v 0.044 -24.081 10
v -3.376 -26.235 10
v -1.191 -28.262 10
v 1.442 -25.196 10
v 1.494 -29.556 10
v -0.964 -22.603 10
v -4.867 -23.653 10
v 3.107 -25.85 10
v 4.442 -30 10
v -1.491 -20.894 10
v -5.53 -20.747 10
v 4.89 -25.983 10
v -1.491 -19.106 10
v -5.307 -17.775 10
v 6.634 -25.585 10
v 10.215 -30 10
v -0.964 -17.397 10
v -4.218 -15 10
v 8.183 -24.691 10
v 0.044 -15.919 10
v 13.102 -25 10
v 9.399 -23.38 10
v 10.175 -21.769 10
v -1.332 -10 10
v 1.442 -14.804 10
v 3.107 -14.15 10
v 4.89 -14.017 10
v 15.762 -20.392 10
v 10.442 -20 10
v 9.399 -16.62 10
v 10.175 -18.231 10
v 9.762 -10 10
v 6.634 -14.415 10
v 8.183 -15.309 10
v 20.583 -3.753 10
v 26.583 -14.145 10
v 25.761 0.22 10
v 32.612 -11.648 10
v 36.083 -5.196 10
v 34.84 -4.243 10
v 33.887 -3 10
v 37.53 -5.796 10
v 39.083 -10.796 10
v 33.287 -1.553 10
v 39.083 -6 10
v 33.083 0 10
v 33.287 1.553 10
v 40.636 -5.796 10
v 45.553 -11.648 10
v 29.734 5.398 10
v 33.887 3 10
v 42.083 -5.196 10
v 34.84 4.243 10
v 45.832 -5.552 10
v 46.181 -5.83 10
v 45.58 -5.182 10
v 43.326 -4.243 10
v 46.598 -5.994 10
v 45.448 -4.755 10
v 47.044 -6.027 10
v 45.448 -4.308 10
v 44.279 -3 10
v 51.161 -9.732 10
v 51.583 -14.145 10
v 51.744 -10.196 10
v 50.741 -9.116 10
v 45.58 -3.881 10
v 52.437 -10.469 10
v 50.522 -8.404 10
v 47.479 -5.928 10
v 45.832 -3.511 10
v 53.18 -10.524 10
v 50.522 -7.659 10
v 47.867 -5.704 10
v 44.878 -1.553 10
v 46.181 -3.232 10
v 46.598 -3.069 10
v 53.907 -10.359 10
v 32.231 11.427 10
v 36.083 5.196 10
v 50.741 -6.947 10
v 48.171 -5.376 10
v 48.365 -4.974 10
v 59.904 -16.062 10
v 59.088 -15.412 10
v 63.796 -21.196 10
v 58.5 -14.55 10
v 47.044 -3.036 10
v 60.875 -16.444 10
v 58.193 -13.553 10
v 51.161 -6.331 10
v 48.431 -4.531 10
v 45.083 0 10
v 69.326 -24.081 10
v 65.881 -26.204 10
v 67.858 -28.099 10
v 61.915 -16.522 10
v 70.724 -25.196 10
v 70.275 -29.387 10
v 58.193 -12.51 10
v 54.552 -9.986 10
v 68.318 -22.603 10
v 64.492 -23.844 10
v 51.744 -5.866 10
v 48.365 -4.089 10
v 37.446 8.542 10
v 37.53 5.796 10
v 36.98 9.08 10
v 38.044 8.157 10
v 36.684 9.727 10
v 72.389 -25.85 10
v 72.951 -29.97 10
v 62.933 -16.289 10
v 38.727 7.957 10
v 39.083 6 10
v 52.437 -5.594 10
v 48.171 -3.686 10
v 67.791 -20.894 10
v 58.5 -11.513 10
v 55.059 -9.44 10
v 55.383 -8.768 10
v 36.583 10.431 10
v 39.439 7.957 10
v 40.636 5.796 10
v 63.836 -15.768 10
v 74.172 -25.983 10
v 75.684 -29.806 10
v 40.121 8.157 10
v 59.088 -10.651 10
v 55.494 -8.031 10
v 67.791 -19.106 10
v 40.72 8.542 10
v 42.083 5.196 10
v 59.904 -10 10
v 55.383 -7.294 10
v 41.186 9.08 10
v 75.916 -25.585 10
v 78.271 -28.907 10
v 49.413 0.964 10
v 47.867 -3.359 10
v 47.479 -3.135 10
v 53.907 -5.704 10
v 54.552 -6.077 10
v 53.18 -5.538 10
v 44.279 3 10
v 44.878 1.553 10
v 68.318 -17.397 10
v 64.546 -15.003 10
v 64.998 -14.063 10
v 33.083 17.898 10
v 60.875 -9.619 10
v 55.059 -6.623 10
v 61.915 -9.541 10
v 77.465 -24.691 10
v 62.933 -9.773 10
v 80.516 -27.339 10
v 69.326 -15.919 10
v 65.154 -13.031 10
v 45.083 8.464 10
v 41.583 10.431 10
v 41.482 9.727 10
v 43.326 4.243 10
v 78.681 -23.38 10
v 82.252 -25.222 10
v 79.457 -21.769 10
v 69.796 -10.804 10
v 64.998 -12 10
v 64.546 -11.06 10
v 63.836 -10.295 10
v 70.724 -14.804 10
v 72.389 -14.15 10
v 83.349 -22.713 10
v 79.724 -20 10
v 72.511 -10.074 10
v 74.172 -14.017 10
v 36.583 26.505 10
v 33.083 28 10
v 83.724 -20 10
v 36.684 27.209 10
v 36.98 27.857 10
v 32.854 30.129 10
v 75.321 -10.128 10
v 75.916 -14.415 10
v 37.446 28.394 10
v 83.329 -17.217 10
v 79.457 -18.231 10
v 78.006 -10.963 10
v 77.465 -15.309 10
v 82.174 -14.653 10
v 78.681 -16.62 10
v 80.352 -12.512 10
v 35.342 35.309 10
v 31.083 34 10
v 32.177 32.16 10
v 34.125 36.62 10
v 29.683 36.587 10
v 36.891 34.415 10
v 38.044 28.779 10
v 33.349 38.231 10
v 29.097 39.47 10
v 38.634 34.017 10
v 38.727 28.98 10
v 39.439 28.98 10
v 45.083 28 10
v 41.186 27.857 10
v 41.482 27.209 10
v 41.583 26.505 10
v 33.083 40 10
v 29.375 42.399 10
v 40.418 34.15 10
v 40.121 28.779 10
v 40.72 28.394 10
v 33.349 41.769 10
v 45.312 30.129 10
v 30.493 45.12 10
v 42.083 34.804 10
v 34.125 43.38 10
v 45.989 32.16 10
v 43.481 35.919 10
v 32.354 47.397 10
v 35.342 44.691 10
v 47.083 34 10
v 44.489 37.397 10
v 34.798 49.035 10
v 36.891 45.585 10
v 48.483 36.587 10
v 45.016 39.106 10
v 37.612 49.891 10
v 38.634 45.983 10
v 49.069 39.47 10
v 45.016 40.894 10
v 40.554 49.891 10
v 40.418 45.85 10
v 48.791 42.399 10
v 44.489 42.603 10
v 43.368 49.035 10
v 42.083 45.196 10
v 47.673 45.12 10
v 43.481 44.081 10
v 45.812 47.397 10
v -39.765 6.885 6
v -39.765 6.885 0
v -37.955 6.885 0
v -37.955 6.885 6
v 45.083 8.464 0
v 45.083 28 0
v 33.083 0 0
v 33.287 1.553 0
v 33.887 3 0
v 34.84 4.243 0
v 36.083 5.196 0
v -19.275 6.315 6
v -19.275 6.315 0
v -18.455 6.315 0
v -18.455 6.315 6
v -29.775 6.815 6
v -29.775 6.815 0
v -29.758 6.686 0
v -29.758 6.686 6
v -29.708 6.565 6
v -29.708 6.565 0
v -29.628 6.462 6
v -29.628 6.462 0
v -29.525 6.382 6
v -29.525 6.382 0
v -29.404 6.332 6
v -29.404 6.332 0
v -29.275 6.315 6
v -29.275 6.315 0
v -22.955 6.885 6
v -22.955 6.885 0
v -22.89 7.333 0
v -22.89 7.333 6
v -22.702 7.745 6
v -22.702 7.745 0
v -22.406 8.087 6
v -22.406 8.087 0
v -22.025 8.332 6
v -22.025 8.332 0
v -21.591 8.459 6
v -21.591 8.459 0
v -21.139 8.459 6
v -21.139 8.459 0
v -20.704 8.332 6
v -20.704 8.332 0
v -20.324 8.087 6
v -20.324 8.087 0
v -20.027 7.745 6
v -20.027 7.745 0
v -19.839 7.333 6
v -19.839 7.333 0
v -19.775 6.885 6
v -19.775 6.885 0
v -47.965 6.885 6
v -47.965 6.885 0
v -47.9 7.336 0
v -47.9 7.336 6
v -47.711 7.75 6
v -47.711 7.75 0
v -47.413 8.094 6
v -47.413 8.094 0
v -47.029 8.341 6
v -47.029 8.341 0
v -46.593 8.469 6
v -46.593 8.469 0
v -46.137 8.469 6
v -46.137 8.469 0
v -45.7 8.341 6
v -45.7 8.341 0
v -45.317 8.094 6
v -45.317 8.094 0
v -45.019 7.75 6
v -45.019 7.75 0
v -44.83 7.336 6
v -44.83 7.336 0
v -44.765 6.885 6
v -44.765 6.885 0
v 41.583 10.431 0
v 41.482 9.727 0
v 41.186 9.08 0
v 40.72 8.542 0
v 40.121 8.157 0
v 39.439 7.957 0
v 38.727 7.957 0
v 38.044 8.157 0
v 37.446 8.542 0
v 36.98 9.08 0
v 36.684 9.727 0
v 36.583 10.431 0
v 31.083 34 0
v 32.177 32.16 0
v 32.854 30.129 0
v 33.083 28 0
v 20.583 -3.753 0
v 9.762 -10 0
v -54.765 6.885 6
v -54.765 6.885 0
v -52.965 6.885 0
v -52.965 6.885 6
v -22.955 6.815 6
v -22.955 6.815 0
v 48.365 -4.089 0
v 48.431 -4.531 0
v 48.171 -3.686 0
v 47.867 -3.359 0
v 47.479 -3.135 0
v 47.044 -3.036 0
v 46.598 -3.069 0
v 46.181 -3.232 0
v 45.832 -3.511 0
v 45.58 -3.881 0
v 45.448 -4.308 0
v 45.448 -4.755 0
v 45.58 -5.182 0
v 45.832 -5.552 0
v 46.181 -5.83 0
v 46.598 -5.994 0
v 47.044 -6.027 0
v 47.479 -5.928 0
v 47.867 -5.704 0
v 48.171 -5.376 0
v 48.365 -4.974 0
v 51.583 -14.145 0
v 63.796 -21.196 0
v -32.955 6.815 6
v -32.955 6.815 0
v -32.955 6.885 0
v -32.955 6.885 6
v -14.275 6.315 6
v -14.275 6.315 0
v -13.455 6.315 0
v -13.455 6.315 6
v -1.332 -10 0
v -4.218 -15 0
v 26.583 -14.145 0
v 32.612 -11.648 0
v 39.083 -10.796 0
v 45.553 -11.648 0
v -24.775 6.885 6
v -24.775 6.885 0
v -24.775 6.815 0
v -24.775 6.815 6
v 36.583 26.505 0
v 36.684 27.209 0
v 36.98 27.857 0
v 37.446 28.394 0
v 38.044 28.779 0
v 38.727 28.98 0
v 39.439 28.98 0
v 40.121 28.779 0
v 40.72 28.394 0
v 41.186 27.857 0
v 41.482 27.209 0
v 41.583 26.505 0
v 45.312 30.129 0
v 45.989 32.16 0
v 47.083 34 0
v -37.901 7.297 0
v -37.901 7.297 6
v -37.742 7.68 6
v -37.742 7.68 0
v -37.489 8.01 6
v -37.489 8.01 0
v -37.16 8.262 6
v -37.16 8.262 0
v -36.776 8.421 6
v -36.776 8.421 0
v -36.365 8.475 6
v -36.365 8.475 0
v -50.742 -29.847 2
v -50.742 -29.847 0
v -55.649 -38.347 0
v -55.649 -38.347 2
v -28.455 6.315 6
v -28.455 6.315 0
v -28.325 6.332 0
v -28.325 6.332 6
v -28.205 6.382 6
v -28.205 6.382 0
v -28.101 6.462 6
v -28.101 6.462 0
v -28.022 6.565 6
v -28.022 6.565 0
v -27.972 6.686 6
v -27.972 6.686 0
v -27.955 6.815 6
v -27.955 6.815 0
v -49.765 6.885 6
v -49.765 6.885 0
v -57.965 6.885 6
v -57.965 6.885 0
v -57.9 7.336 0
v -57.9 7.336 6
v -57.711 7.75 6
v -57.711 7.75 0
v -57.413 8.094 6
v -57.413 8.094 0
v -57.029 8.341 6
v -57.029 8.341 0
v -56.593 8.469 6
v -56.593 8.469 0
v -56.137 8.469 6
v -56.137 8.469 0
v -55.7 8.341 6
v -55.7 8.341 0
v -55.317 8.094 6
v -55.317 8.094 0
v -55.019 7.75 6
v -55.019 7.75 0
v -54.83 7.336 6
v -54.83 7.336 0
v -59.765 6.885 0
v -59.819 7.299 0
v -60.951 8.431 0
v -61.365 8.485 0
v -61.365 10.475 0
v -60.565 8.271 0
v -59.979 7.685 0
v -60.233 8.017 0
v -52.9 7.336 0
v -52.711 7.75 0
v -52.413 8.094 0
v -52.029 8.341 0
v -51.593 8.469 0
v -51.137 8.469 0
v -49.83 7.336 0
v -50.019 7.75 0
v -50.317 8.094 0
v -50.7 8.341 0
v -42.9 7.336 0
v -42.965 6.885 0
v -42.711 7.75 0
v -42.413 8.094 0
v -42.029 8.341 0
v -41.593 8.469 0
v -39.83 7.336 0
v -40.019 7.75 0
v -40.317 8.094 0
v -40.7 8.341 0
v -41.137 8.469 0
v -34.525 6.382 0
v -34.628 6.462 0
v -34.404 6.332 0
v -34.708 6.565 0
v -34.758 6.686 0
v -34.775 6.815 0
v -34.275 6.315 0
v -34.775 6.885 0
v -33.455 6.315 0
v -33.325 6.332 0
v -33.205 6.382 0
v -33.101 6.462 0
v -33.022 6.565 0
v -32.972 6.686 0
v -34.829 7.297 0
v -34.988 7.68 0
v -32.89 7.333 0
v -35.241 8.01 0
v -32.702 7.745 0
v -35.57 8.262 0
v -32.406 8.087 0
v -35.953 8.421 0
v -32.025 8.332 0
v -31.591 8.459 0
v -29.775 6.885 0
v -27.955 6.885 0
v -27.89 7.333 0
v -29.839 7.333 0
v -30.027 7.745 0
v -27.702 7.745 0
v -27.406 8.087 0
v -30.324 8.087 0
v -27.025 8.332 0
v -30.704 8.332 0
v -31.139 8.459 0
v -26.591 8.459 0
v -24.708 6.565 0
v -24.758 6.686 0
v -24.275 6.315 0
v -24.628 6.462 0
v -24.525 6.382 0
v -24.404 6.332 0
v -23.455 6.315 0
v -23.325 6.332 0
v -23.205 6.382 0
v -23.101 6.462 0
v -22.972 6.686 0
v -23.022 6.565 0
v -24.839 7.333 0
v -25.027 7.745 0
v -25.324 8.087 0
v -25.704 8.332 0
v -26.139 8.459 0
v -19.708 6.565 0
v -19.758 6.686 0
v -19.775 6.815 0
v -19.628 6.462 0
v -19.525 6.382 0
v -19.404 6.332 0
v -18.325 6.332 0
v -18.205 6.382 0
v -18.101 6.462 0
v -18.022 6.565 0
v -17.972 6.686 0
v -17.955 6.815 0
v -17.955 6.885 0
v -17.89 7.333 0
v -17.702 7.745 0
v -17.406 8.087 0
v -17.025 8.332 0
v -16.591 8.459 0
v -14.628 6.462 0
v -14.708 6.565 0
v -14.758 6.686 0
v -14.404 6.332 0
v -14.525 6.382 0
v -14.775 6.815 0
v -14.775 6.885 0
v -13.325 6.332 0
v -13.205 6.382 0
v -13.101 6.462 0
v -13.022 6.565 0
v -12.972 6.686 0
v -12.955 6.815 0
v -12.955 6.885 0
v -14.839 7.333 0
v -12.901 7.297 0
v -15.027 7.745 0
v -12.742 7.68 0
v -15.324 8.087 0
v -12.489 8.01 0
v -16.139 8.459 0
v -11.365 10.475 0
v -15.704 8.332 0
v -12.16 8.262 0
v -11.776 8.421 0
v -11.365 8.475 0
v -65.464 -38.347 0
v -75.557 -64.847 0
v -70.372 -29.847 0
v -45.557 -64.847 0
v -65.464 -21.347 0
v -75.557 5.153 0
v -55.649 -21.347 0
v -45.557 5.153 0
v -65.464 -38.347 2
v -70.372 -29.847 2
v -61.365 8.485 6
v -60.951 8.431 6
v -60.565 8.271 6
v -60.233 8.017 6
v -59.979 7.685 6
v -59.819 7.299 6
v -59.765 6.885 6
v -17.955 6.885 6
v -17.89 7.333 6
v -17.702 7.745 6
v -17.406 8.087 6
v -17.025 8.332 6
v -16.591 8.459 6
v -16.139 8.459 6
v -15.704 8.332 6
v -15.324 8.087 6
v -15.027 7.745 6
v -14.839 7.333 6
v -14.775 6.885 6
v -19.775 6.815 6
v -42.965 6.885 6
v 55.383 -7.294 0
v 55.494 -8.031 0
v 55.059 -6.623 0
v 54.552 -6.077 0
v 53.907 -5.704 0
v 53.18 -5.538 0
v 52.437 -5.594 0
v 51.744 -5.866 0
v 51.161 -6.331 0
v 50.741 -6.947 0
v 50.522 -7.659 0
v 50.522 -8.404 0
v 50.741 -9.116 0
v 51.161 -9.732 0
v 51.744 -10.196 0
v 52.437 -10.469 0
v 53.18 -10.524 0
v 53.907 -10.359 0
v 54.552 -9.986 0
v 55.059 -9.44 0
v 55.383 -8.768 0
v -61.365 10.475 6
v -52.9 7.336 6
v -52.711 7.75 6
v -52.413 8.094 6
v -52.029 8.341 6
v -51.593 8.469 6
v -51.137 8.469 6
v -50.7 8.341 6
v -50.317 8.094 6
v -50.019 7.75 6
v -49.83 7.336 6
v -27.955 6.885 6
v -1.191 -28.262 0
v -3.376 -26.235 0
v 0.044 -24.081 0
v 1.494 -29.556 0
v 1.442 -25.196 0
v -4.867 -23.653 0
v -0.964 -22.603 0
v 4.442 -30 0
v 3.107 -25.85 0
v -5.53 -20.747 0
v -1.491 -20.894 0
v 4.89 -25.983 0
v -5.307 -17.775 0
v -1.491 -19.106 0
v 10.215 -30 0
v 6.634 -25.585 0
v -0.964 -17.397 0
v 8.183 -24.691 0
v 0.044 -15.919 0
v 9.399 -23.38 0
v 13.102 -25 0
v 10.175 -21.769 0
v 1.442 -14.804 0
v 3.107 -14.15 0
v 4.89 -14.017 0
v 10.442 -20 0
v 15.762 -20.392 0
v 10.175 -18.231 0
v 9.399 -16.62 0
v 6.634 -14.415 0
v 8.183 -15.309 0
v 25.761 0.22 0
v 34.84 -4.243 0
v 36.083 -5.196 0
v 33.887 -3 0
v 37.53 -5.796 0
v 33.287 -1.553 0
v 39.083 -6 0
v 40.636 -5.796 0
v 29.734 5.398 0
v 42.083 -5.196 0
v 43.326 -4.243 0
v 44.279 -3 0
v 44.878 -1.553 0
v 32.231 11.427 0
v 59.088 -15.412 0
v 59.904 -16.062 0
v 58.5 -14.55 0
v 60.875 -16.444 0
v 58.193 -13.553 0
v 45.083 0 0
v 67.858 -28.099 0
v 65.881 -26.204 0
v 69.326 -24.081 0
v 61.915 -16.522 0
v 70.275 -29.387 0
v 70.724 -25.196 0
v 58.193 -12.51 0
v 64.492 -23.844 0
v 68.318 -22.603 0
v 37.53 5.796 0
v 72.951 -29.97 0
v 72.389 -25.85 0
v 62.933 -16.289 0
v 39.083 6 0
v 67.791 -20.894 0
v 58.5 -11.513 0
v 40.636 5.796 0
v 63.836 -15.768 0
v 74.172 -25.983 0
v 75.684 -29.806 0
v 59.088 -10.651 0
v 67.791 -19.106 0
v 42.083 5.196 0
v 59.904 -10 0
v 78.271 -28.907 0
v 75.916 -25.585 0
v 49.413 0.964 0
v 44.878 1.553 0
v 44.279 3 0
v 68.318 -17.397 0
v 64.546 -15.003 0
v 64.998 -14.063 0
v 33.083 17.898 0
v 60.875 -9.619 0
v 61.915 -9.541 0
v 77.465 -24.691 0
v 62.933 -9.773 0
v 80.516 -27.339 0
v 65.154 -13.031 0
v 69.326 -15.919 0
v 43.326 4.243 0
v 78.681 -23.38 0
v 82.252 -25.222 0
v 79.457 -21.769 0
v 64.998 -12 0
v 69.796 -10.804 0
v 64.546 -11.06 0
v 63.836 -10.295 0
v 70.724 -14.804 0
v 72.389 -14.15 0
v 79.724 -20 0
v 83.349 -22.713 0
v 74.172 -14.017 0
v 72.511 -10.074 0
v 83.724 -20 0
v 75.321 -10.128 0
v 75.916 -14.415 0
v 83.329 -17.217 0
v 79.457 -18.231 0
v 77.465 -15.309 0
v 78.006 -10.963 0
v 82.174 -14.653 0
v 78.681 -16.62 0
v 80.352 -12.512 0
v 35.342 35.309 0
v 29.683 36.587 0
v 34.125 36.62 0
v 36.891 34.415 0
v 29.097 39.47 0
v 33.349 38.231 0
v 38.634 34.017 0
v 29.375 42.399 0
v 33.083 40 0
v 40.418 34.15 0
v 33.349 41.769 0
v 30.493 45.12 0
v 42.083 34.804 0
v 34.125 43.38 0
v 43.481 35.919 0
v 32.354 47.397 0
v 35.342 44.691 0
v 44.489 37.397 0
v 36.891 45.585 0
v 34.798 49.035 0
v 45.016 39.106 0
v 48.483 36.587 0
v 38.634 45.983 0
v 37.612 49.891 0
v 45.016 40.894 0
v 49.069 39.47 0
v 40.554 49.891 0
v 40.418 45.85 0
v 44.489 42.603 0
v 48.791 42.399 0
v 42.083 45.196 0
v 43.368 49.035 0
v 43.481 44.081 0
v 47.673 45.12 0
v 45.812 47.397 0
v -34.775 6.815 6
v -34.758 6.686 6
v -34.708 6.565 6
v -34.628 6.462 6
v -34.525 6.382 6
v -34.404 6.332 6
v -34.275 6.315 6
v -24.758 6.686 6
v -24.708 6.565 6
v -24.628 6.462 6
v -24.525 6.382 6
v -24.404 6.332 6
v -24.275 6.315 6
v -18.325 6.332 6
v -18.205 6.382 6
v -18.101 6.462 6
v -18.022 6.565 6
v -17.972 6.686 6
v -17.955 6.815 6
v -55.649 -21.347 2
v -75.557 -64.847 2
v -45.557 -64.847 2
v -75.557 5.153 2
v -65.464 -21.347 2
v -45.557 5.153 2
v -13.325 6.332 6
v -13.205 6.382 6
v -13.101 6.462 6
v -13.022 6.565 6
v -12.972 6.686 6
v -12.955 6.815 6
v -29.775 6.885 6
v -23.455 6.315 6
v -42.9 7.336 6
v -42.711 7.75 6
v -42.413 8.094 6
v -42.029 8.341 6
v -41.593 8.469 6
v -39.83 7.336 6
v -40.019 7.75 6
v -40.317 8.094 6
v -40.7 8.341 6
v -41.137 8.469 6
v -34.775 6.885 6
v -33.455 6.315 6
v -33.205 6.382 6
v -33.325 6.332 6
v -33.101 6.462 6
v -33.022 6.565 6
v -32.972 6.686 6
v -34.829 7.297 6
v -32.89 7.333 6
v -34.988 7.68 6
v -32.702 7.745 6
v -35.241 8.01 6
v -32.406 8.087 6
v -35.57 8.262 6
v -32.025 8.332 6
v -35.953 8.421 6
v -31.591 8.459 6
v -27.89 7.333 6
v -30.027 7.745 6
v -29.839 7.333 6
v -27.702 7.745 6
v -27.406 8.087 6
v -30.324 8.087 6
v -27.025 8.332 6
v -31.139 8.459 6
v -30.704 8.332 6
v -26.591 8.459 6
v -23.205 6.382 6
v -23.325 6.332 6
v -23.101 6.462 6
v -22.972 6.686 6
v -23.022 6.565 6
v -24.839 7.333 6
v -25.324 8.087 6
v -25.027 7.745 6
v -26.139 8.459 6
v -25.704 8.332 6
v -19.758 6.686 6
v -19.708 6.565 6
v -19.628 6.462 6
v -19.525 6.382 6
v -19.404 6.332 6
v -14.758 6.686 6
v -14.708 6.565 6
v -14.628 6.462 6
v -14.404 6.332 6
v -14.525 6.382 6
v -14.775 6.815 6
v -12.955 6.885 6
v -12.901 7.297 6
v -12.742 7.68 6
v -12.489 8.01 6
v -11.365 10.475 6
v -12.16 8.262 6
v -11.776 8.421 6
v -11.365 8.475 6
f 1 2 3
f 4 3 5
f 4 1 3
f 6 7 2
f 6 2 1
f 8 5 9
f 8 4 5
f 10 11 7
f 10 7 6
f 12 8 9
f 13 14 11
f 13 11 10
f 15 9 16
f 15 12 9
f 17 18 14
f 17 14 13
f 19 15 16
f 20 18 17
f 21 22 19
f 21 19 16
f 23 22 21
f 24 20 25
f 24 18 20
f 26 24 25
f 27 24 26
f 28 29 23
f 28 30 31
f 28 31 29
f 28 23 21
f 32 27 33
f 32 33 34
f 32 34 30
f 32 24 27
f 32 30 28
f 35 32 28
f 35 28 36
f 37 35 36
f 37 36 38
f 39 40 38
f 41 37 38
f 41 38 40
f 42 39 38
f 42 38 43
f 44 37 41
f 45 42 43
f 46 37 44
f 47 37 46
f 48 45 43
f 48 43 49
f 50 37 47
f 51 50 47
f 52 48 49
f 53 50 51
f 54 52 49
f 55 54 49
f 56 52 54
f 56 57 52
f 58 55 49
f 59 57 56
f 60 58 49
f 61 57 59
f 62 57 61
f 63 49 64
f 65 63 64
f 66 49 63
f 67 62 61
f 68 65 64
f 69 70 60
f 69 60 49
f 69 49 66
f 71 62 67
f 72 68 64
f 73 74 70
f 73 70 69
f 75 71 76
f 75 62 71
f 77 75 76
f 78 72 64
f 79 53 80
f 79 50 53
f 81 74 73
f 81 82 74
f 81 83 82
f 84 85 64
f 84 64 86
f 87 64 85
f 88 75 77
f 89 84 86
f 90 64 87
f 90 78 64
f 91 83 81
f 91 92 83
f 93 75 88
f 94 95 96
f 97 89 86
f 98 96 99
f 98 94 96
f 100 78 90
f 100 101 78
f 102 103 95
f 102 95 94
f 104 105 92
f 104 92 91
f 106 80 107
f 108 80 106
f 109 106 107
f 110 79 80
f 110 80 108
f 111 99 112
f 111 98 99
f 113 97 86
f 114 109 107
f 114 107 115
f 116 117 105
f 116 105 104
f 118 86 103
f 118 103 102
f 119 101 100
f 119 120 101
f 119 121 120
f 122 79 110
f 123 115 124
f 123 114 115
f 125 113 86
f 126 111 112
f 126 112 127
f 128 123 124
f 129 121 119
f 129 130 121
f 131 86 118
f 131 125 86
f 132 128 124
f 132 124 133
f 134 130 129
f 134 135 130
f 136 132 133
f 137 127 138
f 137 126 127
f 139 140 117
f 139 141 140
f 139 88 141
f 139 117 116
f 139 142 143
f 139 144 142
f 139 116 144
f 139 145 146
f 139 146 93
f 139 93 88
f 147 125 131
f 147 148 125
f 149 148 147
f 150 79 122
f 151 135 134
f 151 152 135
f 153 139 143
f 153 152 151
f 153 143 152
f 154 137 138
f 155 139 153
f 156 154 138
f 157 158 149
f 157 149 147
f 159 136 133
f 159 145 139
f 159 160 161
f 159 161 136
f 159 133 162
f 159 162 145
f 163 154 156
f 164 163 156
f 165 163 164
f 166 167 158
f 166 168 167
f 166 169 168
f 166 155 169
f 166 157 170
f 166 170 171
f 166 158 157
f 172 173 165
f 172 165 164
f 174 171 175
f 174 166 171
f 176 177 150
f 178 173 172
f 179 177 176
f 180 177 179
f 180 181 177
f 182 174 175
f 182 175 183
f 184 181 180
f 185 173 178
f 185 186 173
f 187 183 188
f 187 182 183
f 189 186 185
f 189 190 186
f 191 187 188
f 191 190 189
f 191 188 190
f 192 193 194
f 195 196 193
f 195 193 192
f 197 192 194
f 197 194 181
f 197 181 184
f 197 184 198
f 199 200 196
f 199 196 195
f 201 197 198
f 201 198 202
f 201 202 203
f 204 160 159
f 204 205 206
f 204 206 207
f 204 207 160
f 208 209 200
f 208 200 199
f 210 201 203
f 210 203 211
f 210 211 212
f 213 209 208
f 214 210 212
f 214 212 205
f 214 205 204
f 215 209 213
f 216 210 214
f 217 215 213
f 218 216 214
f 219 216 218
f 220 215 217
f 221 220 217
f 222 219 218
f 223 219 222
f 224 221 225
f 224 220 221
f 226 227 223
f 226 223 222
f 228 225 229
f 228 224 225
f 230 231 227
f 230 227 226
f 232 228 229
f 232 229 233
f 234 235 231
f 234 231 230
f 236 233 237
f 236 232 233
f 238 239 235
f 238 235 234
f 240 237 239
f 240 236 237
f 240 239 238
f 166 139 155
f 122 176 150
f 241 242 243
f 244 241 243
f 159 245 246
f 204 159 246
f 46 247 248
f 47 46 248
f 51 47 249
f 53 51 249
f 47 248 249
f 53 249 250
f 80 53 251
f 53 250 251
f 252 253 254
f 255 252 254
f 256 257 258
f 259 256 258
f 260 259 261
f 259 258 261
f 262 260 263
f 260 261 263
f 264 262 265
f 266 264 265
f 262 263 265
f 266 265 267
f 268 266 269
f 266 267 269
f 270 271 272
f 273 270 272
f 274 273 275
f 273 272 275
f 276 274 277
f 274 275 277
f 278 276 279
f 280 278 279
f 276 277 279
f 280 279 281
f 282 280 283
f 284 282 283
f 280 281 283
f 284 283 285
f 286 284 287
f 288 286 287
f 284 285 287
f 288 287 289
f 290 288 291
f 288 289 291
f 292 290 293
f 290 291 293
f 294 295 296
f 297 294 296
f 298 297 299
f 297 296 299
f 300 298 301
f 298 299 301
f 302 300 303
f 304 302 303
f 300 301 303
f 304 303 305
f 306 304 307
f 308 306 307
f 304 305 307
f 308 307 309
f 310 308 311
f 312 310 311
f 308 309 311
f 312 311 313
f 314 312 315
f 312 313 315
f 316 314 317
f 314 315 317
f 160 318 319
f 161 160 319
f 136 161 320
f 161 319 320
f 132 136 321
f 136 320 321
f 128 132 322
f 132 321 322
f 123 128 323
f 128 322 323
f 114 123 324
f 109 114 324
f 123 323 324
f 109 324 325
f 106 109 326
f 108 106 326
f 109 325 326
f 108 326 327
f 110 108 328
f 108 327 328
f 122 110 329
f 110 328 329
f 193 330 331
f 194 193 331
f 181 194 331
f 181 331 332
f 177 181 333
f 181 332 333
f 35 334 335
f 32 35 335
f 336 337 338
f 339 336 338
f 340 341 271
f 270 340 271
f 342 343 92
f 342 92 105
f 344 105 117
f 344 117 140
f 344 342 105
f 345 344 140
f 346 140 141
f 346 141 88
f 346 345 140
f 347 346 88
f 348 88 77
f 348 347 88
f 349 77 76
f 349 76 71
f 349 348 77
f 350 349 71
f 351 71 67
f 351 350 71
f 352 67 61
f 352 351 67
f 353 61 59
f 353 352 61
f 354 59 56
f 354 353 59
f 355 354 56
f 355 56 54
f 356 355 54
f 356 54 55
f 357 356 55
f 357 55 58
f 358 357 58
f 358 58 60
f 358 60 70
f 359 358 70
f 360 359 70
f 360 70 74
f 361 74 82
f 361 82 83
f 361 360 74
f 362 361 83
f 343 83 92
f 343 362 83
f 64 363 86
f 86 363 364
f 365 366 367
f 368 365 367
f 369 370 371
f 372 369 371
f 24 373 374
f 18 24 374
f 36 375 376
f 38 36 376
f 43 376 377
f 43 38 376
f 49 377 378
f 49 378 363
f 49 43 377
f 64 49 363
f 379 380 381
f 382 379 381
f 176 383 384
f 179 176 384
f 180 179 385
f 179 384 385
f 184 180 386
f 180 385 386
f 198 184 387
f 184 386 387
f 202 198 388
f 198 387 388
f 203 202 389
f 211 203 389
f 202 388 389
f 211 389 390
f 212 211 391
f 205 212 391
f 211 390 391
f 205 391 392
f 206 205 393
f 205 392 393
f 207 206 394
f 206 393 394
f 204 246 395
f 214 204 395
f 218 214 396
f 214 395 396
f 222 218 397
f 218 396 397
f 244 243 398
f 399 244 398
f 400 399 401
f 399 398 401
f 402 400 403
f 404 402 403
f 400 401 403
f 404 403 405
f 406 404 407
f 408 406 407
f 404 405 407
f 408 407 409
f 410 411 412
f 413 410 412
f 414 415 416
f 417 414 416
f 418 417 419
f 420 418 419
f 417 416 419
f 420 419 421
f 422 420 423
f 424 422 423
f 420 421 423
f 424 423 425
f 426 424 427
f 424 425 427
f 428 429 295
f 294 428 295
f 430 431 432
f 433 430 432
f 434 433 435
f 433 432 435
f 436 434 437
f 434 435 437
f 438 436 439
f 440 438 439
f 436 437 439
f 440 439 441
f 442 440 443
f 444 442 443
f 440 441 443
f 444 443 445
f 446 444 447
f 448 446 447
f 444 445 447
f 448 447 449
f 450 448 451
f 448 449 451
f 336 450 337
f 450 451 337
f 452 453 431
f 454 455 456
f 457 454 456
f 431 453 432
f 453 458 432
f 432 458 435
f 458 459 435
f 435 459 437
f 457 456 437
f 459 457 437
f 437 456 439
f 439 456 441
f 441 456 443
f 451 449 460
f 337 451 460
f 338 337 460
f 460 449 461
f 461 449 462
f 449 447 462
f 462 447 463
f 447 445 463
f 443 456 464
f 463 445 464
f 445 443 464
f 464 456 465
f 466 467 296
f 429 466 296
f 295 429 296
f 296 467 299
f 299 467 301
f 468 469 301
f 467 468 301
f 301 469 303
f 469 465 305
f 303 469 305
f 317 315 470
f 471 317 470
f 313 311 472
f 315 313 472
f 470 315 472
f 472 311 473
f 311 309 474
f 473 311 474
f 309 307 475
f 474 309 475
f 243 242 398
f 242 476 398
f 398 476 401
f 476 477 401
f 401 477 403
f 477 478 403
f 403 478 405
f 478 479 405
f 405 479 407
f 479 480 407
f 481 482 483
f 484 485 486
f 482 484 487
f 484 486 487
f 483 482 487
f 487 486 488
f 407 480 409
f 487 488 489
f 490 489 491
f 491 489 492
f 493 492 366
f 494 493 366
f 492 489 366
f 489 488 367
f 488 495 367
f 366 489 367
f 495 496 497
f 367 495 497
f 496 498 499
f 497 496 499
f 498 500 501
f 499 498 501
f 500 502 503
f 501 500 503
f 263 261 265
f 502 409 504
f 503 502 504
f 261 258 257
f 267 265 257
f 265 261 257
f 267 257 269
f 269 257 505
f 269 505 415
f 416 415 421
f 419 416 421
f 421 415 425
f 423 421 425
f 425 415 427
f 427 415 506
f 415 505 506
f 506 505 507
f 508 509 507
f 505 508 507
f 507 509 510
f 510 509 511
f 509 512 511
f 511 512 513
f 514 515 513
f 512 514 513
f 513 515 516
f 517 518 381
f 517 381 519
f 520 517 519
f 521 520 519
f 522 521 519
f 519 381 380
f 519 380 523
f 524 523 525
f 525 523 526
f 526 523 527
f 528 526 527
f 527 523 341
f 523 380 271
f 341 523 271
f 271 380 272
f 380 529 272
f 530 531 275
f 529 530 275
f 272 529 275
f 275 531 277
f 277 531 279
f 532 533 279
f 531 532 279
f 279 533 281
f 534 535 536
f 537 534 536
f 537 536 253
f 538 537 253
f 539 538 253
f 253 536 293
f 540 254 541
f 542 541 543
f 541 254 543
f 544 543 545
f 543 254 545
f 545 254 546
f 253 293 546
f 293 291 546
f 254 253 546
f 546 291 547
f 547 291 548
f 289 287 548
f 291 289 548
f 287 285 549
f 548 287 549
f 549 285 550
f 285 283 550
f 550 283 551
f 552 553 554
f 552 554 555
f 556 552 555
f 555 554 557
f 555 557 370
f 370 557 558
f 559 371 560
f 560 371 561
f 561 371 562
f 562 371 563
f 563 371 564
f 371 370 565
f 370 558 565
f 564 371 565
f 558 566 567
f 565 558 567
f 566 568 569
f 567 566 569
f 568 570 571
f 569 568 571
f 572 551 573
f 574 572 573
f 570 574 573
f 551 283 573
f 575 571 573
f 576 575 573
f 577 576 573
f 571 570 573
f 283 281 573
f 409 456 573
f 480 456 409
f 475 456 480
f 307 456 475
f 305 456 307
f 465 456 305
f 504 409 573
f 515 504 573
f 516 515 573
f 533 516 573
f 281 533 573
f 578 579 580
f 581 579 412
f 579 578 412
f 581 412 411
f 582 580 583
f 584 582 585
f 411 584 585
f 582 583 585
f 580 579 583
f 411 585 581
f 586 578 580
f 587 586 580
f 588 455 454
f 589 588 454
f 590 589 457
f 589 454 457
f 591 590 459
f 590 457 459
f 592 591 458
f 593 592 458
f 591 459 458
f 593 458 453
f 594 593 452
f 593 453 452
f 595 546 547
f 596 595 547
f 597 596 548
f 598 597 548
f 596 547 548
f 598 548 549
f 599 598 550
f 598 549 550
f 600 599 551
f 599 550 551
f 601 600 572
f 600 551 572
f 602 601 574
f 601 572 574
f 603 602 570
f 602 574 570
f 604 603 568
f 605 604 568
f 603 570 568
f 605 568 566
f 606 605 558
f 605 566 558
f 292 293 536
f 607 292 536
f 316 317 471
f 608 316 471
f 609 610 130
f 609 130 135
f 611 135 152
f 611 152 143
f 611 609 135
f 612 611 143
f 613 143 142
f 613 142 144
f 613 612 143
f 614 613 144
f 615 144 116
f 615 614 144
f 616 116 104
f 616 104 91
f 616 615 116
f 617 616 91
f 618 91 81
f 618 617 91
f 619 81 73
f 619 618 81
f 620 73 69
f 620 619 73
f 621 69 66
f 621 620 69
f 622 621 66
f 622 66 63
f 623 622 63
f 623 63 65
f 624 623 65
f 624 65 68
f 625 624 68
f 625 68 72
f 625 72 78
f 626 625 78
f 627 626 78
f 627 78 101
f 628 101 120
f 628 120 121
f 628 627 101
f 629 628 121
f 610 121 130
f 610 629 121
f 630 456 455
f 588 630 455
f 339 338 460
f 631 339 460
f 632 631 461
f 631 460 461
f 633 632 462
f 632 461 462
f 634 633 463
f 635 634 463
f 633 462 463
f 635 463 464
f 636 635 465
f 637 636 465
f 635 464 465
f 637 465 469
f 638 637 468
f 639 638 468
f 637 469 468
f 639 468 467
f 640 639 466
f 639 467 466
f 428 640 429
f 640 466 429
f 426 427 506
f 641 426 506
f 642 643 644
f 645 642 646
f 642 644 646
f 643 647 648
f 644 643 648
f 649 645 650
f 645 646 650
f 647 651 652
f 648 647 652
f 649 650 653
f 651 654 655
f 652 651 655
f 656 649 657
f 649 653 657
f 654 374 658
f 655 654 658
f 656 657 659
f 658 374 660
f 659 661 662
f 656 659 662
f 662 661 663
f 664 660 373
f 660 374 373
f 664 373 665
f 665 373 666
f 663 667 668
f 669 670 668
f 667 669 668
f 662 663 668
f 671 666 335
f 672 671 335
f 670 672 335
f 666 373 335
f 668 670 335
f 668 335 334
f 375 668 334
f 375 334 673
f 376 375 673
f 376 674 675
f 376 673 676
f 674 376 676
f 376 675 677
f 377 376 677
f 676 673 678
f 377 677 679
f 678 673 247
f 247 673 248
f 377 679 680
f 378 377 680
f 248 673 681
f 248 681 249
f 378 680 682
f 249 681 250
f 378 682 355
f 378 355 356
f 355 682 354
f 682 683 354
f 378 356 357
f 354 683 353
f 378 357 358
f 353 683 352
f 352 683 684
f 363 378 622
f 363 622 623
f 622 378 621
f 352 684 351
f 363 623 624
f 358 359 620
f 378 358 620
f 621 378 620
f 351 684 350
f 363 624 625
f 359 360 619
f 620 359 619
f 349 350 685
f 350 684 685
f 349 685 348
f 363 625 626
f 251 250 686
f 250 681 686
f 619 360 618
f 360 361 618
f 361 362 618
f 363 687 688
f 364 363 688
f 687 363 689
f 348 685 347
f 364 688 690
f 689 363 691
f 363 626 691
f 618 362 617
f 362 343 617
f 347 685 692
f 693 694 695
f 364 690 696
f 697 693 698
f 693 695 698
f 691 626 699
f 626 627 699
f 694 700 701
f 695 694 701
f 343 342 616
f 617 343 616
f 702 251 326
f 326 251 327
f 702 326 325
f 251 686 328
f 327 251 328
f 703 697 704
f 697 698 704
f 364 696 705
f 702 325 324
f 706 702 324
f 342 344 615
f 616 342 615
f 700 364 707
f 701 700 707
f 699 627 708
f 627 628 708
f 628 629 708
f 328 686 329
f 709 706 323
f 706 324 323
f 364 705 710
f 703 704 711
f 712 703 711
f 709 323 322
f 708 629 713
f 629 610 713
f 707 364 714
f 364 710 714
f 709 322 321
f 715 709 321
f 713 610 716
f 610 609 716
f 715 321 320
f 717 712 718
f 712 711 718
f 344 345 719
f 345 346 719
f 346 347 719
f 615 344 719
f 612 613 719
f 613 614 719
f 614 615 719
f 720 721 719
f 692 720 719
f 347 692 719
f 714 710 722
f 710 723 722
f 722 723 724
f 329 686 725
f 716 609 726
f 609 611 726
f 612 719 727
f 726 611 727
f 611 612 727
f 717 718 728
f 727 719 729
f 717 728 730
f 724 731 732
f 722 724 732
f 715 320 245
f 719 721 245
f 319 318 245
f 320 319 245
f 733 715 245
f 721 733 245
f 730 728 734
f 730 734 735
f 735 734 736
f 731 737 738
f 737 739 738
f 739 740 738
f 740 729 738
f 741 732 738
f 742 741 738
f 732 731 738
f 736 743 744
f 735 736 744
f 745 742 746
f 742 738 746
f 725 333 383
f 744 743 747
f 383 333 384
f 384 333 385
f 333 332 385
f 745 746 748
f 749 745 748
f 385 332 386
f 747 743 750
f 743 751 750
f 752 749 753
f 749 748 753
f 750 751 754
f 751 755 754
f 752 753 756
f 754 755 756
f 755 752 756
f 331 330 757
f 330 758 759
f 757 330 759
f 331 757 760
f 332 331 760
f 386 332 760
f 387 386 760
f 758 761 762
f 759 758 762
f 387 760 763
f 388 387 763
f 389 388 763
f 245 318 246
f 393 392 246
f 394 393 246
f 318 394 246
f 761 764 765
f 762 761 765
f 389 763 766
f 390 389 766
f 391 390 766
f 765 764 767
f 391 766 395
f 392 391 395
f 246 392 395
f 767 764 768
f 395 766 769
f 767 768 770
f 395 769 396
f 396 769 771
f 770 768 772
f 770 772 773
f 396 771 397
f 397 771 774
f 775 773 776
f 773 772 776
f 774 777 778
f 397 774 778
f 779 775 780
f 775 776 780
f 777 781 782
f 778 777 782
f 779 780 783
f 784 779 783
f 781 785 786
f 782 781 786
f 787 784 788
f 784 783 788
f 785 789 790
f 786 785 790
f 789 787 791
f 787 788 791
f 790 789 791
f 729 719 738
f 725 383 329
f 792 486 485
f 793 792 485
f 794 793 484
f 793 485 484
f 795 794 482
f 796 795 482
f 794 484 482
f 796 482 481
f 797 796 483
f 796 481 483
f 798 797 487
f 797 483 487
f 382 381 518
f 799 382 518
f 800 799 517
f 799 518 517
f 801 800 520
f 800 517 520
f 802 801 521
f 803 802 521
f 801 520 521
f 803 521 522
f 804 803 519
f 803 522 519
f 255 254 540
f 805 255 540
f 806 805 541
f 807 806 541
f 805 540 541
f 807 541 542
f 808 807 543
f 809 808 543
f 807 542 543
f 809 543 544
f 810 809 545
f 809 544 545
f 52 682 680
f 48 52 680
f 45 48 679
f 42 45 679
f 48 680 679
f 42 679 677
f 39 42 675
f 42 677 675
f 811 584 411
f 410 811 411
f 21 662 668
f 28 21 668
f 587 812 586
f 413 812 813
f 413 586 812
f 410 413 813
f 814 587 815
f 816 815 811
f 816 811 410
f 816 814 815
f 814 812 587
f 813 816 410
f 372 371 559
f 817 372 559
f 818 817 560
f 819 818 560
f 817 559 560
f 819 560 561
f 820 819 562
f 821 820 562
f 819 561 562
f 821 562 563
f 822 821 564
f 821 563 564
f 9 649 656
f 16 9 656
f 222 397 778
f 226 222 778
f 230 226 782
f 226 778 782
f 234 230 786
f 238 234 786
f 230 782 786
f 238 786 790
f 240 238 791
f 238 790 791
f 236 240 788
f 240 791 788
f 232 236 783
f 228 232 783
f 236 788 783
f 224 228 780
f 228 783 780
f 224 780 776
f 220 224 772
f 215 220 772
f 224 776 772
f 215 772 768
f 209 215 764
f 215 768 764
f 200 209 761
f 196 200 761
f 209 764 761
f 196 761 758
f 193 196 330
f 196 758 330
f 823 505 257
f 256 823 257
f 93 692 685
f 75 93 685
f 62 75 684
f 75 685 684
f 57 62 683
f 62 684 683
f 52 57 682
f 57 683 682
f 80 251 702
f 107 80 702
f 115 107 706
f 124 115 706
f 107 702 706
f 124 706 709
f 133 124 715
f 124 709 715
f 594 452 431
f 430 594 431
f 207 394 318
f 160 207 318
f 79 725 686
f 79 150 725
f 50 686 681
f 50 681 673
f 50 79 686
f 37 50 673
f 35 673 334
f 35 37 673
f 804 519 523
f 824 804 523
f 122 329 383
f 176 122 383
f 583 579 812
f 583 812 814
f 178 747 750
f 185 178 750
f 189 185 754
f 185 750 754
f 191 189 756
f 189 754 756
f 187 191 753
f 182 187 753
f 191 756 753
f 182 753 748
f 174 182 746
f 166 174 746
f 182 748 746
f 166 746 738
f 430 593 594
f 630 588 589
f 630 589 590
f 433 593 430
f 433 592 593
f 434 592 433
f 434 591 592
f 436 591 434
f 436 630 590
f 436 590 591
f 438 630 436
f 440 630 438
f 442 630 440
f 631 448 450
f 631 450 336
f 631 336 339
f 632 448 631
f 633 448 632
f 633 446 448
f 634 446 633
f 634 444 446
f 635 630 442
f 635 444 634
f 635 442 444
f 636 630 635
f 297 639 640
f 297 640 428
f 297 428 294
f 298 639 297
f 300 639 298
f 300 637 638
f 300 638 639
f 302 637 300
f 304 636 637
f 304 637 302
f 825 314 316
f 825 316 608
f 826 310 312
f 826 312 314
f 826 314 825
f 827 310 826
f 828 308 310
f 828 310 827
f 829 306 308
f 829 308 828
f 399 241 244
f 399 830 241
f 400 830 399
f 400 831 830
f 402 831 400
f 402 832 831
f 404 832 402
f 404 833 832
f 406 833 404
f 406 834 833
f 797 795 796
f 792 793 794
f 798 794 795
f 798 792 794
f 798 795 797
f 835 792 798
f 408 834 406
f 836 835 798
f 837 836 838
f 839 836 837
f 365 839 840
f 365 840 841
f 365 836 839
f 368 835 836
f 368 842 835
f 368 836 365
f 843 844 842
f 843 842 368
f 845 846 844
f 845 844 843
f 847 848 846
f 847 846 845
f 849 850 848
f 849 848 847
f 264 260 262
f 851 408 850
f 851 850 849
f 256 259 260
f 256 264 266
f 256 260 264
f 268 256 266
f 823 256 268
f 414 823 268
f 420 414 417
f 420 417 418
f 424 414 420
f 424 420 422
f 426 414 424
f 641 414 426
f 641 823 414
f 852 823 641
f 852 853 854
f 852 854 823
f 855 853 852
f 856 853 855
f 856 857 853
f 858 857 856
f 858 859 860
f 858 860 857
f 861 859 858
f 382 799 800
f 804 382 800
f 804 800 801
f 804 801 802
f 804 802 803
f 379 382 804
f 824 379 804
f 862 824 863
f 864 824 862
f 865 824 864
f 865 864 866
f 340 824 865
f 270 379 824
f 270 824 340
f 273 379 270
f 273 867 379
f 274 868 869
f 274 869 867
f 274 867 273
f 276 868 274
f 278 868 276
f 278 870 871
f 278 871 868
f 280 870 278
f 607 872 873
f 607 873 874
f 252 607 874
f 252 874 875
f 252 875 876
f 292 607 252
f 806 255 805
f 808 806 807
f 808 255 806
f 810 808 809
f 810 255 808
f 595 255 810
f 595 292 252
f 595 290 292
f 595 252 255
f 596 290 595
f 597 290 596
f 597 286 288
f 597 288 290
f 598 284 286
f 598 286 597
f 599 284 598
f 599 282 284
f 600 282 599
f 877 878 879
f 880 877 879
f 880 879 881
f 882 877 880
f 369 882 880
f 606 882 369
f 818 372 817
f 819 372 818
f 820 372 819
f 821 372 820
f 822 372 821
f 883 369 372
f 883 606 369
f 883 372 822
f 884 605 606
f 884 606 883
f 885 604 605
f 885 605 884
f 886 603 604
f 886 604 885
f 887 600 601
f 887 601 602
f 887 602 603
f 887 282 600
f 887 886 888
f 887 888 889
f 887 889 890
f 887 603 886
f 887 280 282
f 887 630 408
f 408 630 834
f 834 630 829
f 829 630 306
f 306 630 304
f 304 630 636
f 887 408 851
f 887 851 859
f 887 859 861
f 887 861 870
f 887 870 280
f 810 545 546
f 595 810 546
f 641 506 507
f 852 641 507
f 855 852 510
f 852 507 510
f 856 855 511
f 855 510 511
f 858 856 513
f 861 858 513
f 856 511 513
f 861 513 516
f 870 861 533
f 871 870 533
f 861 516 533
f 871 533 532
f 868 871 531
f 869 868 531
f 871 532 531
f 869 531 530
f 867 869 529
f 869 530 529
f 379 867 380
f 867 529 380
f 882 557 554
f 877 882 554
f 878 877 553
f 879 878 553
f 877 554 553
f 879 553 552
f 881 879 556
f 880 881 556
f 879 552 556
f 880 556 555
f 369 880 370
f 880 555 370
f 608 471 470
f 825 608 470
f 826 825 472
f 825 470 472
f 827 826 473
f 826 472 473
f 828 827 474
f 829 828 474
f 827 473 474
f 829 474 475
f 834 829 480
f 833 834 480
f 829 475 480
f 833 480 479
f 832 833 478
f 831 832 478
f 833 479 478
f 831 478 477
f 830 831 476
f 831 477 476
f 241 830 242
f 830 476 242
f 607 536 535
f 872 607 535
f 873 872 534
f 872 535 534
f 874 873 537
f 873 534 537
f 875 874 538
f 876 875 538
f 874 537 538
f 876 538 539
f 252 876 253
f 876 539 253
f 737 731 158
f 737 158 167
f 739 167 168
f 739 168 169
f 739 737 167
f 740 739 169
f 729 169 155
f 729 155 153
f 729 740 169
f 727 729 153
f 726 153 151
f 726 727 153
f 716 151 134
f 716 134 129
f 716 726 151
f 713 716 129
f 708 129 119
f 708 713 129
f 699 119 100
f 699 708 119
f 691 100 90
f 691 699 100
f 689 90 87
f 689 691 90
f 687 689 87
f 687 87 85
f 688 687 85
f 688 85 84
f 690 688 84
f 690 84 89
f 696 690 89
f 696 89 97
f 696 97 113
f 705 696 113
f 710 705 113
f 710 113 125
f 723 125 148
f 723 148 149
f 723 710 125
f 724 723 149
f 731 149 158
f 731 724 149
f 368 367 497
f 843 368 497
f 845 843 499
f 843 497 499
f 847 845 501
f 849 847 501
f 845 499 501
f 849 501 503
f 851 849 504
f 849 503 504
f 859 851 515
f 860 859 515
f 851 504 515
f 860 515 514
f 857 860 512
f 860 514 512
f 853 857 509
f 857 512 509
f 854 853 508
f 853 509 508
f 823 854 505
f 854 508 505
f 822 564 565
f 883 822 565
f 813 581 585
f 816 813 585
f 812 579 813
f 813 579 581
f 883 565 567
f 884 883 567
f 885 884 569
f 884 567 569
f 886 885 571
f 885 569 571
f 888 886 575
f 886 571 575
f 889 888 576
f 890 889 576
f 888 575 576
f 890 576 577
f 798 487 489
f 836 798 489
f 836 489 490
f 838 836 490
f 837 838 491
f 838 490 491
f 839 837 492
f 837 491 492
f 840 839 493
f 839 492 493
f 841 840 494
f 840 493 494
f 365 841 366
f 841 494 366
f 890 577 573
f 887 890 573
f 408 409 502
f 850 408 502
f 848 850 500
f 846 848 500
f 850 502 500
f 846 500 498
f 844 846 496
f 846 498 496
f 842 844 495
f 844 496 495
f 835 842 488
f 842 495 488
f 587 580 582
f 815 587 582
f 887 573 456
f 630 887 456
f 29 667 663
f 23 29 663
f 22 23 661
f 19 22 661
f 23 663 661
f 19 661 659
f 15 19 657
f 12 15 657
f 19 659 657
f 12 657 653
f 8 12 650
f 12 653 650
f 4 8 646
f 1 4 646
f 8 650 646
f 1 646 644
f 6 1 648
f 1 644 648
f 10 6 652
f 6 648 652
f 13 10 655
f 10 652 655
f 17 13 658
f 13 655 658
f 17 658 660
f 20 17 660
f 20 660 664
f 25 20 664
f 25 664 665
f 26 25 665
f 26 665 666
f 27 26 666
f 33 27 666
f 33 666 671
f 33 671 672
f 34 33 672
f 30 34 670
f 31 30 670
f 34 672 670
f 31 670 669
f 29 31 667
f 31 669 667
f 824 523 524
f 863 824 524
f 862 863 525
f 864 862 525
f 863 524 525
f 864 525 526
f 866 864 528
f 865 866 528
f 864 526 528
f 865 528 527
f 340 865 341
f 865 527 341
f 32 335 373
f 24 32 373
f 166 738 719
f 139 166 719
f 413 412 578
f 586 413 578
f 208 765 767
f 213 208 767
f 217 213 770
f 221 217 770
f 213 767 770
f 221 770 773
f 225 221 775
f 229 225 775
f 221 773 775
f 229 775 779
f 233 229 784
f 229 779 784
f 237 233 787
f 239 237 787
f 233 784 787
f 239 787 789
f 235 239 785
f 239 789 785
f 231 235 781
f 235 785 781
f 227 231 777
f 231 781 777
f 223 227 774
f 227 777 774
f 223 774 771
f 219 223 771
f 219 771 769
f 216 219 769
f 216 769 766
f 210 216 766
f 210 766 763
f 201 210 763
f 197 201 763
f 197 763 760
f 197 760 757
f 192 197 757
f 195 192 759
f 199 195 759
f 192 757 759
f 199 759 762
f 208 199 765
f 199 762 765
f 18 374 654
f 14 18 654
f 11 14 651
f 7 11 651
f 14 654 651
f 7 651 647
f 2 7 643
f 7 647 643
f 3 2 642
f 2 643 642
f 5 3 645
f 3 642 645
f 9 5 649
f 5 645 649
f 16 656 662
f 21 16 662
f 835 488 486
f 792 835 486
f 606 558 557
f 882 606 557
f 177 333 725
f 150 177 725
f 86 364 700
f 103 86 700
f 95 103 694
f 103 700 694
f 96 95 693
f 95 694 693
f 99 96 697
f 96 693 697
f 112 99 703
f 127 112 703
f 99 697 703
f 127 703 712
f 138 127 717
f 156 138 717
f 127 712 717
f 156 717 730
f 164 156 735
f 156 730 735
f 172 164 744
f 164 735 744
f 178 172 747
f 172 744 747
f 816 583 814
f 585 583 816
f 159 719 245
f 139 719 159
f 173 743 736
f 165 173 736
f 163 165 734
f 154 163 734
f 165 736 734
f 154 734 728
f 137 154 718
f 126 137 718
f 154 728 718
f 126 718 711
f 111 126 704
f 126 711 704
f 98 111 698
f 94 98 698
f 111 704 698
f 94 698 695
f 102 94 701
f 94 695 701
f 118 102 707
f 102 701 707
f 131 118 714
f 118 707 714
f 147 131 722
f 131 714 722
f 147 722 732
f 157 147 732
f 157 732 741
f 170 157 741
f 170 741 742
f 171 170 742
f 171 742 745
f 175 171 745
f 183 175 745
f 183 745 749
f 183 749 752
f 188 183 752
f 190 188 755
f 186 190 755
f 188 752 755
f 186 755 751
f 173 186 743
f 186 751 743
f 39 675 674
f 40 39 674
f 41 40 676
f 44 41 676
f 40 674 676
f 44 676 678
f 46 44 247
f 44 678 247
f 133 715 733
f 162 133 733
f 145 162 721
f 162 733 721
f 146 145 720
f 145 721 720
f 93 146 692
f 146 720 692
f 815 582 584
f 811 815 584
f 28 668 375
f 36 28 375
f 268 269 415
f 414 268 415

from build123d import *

# Parameters (mm, degrees)
F1_DEPTH = 6
F2_R     = 2.5
F2_R_2   = 3.5
F2_R_3   = 1.5
F3_DEPTH = 10
F4_R     = 25
F5_SIZE  = 5
F2_W     = 30
F2_H     = 70
F6_DEPTH = 2


# Not quite as in the source:
# - a feature names something its author has since deleted; it is built from what else it names


with BuildPart() as f1:
    # F0 (on Top) → F1 (new body)
    with BuildSketch(Plane.XY):
        with BuildLine():
            Line((-39.7648132003, 6.8852591163), (-37.9548132003, 6.8852591163))
            ThreePointArc((-37.9548132003, 6.8852591163), (-37.4891129824, 8.0095588984), (-36.3648132003, 8.4752591163))
            Line((-36.3648132003, 8.4752591163), (-36.3648132003, 10.4752591163))
            Line((-36.3648132003, 10.4752591163), (-61.3648132003, 10.4752591163))
            Line((-61.3648132003, 10.4752591163), (-61.3648132003, 8.4852591163))
            ThreePointArc((-61.3648132003, 8.4852591163), (-60.2334423504, 8.0166299662), (-59.7648132003, 6.8852591163))
            Line((-59.7648132003, 6.8852591163), (-57.9648132003, 6.8852591163))
            ThreePointArc((-57.9648132003, 6.8852591163), (-56.3648132003, 8.4852591163), (-54.7648132003, 6.8852591163))
            Line((-54.7648132003, 6.8852591163), (-52.9648132003, 6.8852591163))
            ThreePointArc((-52.9648132003, 6.8852591163), (-51.3648132003, 8.4852591163), (-49.7648132003, 6.8852591163))
            Line((-49.7648132003, 6.8852591163), (-47.9648132003, 6.8852591163))
            ThreePointArc((-47.9648132003, 6.8852591163), (-46.3648132003, 8.4852591163), (-44.7648132003, 6.8852591163))
            Line((-44.7648132003, 6.8852591163), (-42.9648132003, 6.8852591163))
            ThreePointArc((-42.9648132003, 6.8852591163), (-41.3648132003, 8.4852591163), (-39.7648132003, 6.8852591163))
        make_face()
        with BuildLine():
            Line((-36.3648132003, 10.4752591163), (-36.3648132003, 8.4752591163))
            ThreePointArc((-36.3648132003, 8.4752591163), (-35.2405134182, 8.0095588984), (-34.7748132003, 6.8852591163))
            Line((-34.7748132003, 6.8852591163), (-34.7748132003, 6.8152591163))
            ThreePointArc((-34.7748132003, 6.8152591163), (-34.6283665909, 6.4617057257), (-34.2748132003, 6.3152591163))
            Line((-34.2748132003, 6.3152591163), (-33.9548132003, 6.3152591163))
            Line((-33.9548132003, 6.3152591163), (-33.4548132003, 6.3152591163))
            ThreePointArc((-33.4548132003, 6.3152591163), (-33.1012598097, 6.4617057257), (-32.9548132003, 6.8152591163))
            Line((-32.9548132003, 6.8152591163), (-32.9548132003, 6.8852591163))
            ThreePointArc((-32.9548132003, 6.8852591163), (-31.3648132003, 8.4752591163), (-29.7748132003, 6.8852591163))
            Line((-29.7748132003, 6.8852591163), (-29.7748132003, 6.8152591163))
            ThreePointArc((-29.7748132003, 6.8152591163), (-29.6283665909, 6.4617057257), (-29.2748132003, 6.3152591163))
            Line((-29.2748132003, 6.3152591163), (-28.9548132003, 6.3152591163))
            Line((-28.9548132003, 6.3152591163), (-28.4548132003, 6.3152591163))
            ThreePointArc((-28.4548132003, 6.3152591163), (-28.1012598097, 6.4617057257), (-27.9548132003, 6.8152591163))
            Line((-27.9548132003, 6.8152591163), (-27.9548132003, 6.8852591163))
            ThreePointArc((-27.9548132003, 6.8852591163), (-26.3648132003, 8.4752591163), (-24.7748132003, 6.8852591163))
            Line((-24.7748132003, 6.8852591163), (-24.7748132003, 6.8152591163))
            ThreePointArc((-24.7748132003, 6.8152591163), (-24.6283665909, 6.4617057257), (-24.2748132003, 6.3152591163))
            Line((-24.2748132003, 6.3152591163), (-23.9548132003, 6.3152591163))
            Line((-23.9548132003, 6.3152591163), (-23.4548132003, 6.3152591163))
            ThreePointArc((-23.4548132003, 6.3152591163), (-23.1012598097, 6.4617057257), (-22.9548132003, 6.8152591163))
            Line((-22.9548132003, 6.8152591163), (-22.9548132003, 6.8852591163))
            ThreePointArc((-22.9548132003, 6.8852591163), (-21.3648132003, 8.4752591163), (-19.7748132003, 6.8852591163))
            Line((-19.7748132003, 6.8852591163), (-19.7748132003, 6.8152591163))
            ThreePointArc((-19.7748132003, 6.8152591163), (-19.6283665909, 6.4617057257), (-19.2748132003, 6.3152591163))
            Line((-19.2748132003, 6.3152591163), (-18.9548132003, 6.3152591163))
            Line((-18.9548132003, 6.3152591163), (-18.4548132003, 6.3152591163))
            ThreePointArc((-18.4548132003, 6.3152591163), (-18.1012598097, 6.4617057257), (-17.9548132003, 6.8152591163))
            Line((-17.9548132003, 6.8152591163), (-17.9548132003, 6.8852591163))
            ThreePointArc((-17.9548132003, 6.8852591163), (-16.3648132003, 8.4752591163), (-14.7748132003, 6.8852591163))
            Line((-14.7748132003, 6.8852591163), (-14.7748132003, 6.8152591163))
            ThreePointArc((-14.7748132003, 6.8152591163), (-14.6283665909, 6.4617057257), (-14.2748132003, 6.3152591163))
            Line((-14.2748132003, 6.3152591163), (-13.9548132003, 6.3152591163))
            Line((-13.9548132003, 6.3152591163), (-13.4548132003, 6.3152591163))
            ThreePointArc((-13.4548132003, 6.3152591163), (-13.1012598097, 6.4617057257), (-12.9548132003, 6.8152591163))
            Line((-12.9548132003, 6.8152591163), (-12.9548132003, 6.8852591163))
            ThreePointArc((-12.9548132003, 6.8852591163), (-12.4891129824, 8.0095588984), (-11.3648132003, 8.4752591163))
            Line((-11.3648132003, 8.4752591163), (-11.3648132003, 10.4752591163))
            Line((-11.3648132003, 10.4752591163), (-36.3648132003, 10.4752591163))
        make_face()
    extrude(amount=F1_DEPTH)


with BuildPart() as f3:
    # F2 (on Top) → F3 (new body)
    with BuildSketch(Plane.XY):
        with BuildLine():
            ThreePointArc((36.0828736126, 5.1961524227), (39.0828736126, 6), (42.0828736126, 5.1961524227))
            Line((42.0828736126, 5.1961524227), (45.0828736126, 3.4641016151))
            Line((45.0828736126, 3.4641016151), (45.0828736126, 28))
            ThreePointArc((45.0828736126, 28), (45.5960406321, 31.1622776602), (47.0828736126, 34))
            ThreePointArc((47.0828736126, 34), (39.0828736126, 50), (31.0828736126, 34))
            ThreePointArc((31.0828736126, 34), (32.5697065931, 31.1622776602), (33.0828736126, 28))
            Line((33.0828736126, 28), (33.0828736126, 3.4641016151))
            Line((33.0828736126, 3.4641016151), (36.0828736126, 5.1961524227))
        make_face()
        with BuildLine():
            Line((41.5828736126, 26.5050698072), (41.5828736126, 10.4311462492))
            ThreePointArc((41.5828736126, 10.4311462492), (39.0828736126, 7.9311462492), (36.5828736126, 10.4311462492))
            Line((36.5828736126, 10.4311462492), (36.5828736126, 26.5050698072))
            ThreePointArc((36.5828736126, 26.5050698072), (39.0828736126, 29.0050698072), (41.5828736126, 26.5050698072))
        make_face(mode=Mode.SUBTRACT)
        with BuildLine():
            ThreePointArc((45.0828736126, 40), (39.0828736126, 34), (33.0828736126, 40))
            ThreePointArc((33.0828736126, 40), (39.0828736126, 46), (45.0828736126, 40))
        make_face(mode=Mode.SUBTRACT)
        with BuildLine():
            ThreePointArc((36.0828736126, -5.1961524227), (33.8867211899, -3), (33.0828736126, 0))
            Line((33.0828736126, 0), (33.0828736126, 3.4641016151))
            Line((33.0828736126, 3.4641016151), (9.762365537, -10))
            Line((9.762365537, -10), (10.2153601532, -10))
            Line((10.2153601532, -10), (13.1021114244, -14.9999998707))
            Line((13.1021114244, -14.9999998707), (15.9888628451, -20))
            Line((15.9888628451, -20), (15.762365537, -20.3923048454))
            Line((15.762365537, -20.3923048454), (39.0828736126, -6.9282032303))
            Line((39.0828736126, -6.9282032303), (36.0828736126, -5.1961524227))
        make_face()
        with BuildLine():
            Line((7.4418574613, -25.1961524227), (14.3700606915, -21.1961524227))
            ThreePointArc((14.3700606915, -21.1961524227), (14.4238921312, -20.5991526088), (14.4418574613, -20))
            ThreePointArc((14.4418574613, -20), (14.1011157048, -17.4118094768), (13.1021114244, -14.9999998707))
            ThreePointArc((13.1021114244, -14.9999998707), (11.0765569379, -12.5179706727), (8.3700606915, -10.8038475773))
            Line((8.3700606915, -10.8038475773), (1.4418574613, -14.8038475773))
            ThreePointArc((1.4418574613, -14.8038475773), (7.4418574613, -14.8038475773), (10.4418574613, -20))
            ThreePointArc((10.4418574613, -20), (9.638009884, -23), (7.4418574613, -25.1961524227))
        make_face()
        with BuildLine():
            ThreePointArc((13.1021114676, -25.0000000546), (13.9286904318, -23.1622776901), (14.3700606915, -21.1961524227))
            Line((14.3700606915, -21.1961524227), (7.4418574613, -25.1961524227))
            ThreePointArc((7.4418574613, -25.1961524227), (-0.7542949614, -23), (1.4418574613, -14.8038475773))
            Line((1.4418574613, -14.8038475773), (8.3700606915, -10.8038475773))
            ThreePointArc((8.3700606915, -10.8038475773), (6.446661164, -10.2030228073), (4.4418574613, -10))
            ThreePointArc((4.4418574613, -10), (-0.5581425291, -11.3397459566), (-4.2183965654, -14.9999999807))
            ThreePointArc((-4.2183965654, -14.9999999807), (-5.5581425387, -19.9999998376), (-4.2183967279, -24.9999997379))
            ThreePointArc((-4.2183967279, -24.9999997379), (-0.5581426698, -28.6602539622), (4.4418574613, -30))
            ThreePointArc((4.4418574613, -30), (9.441857434, -28.6602540536), (13.1021114676, -25.0000000546))
        make_face()
        with BuildLine():
            Line((45.0828736126, 3.4641016151), (45.0828736126, 0))
            ThreePointArc((45.0828736126, 0), (44.2790260353, -3), (42.0828736126, -5.1961524227))
            Line((42.0828736126, -5.1961524227), (39.0828736126, -6.9282032303))
            Line((39.0828736126, -6.9282032303), (63.7956865337, -21.1961524227))
            ThreePointArc((63.7956865337, -21.1961524227), (65.0636357262, -15), (69.7956865337, -10.8038475773))
            Line((69.7956865337, -10.8038475773), (45.0828736126, 3.4641016151))
        make_face()
        with Locations((52.9936231899, -8.0313750131)):
            Circle(F2_R, mode=Mode.SUBTRACT)
        with Locations((61.6538772277, -13.0313750131)):
            Circle(F2_R_2, mode=Mode.SUBTRACT)
        with Locations((46.9314453634, -4.5313750131)):
            Circle(F2_R_3, mode=Mode.SUBTRACT)
        with BuildLine():
            ThreePointArc((83.723889764, -20), (79.2337884789, -11.6548806988), (69.7956865337, -10.8038475773))
            Line((69.7956865337, -10.8038475773), (76.723889764, -14.8038475773))
            ThreePointArc((76.723889764, -14.8038475773), (78.9200421867, -17), (79.723889764, -20))
            ThreePointArc((79.723889764, -20), (76.723889764, -25.1961524227), (70.723889764, -25.1961524227))
            Line((70.723889764, -25.1961524227), (63.7956865337, -21.1961524227))
            ThreePointArc((63.7956865337, -21.1961524227), (74.3230423728, -29.9820346699), (83.723889764, -20))
        make_face()
        with BuildLine():
            Line((76.723889764, -14.8038475773), (69.7956865337, -10.8038475773))
            ThreePointArc((69.7956865337, -10.8038475773), (65.0636357262, -15), (63.7956865337, -21.1961524227))
            Line((63.7956865337, -21.1961524227), (70.723889764, -25.1961524227))
            ThreePointArc((70.723889764, -25.1961524227), (68.5277373413, -17), (76.723889764, -14.8038475773))
        make_face()
        with BuildLine():
            Line((39.0828736126, -6.9282032303), (42.0828736126, -5.1961524227))
            ThreePointArc((42.0828736126, -5.1961524227), (39.0828736126, -6), (36.0828736126, -5.1961524227))
            Line((36.0828736126, -5.1961524227), (39.0828736126, -6.9282032303))
        make_face()
        with BuildLine():
            Line((33.0828736126, 3.4641016151), (33.0828736126, 0))
            ThreePointArc((33.0828736126, 0), (33.8867211899, 3), (36.0828736126, 5.1961524227))
            Line((36.0828736126, 5.1961524227), (33.0828736126, 3.4641016151))
        make_face()
        with BuildLine():
            ThreePointArc((42.0828736126, 5.1961524227), (44.2790260353, 3), (45.0828736126, 0))
            Line((45.0828736126, 0), (45.0828736126, 3.4641016151))
            Line((45.0828736126, 3.4641016151), (42.0828736126, 5.1961524227))
        make_face()
        with BuildLine():
            Line((10.2153601532, -10), (9.762365537, -10))
            Line((9.762365537, -10), (8.3700606915, -10.8038475773))
            ThreePointArc((8.3700606915, -10.8038475773), (11.0765569379, -12.5179706727), (13.1021114244, -14.9999998707))
            Line((13.1021114244, -14.9999998707), (10.2153601532, -10))
        make_face()
        with BuildLine():
            Line((8.3700606915, -10.8038475773), (9.762365537, -10))
            Line((9.762365537, -10), (4.4418574613, -10))
            ThreePointArc((4.4418574613, -10), (6.446661164, -10.2030228073), (8.3700606915, -10.8038475773))
        make_face()
        with BuildLine():
            ThreePointArc((-4.2183965654, -14.9999999807), (-0.5581425291, -11.3397459566), (4.4418574613, -10))
            Line((4.4418574613, -10), (-1.3316452306, -10))
            Line((-1.3316452306, -10), (-4.2183965654, -14.9999999807))
        make_face()
        with BuildLine():
            Line((14.3700606915, -21.1961524227), (15.762365537, -20.3923048454))
            Line((15.762365537, -20.3923048454), (15.9888628451, -20))
            Line((15.9888628451, -20), (13.1021114244, -14.9999998707))
            ThreePointArc((13.1021114244, -14.9999998707), (14.1011157048, -17.4118094768), (14.4418574613, -20))
            ThreePointArc((14.4418574613, -20), (14.4238921312, -20.5991526088), (14.3700606915, -21.1961524227))
        make_face()
        with BuildLine():
            Line((13.1021114676, -25.0000000546), (15.762365537, -20.3923048454))
            Line((15.762365537, -20.3923048454), (14.3700606915, -21.1961524227))
            ThreePointArc((14.3700606915, -21.1961524227), (13.9286904318, -23.1622776901), (13.1021114676, -25.0000000546))
        make_face()
        with BuildLine():
            Line((10.2153601532, -30), (13.1021114676, -25.0000000546))
            ThreePointArc((13.1021114676, -25.0000000546), (9.441857434, -28.6602540536), (4.4418574613, -30))
            Line((4.4418574613, -30), (10.2153601532, -30))
        make_face()
    extrude(amount=F3_DEPTH)

    # F4
    f4_edges = [f3.edges().sort_by_distance(p)[0] for p in [
        (33.082874, 3.464102, 5),
        (39.082874, -6.928203, 5),
    ]]
    fillet(f4_edges, radius=F4_R)

    # F5
    f5_edges = [f3.edges().sort_by_distance(p)[0] for p in [
        (45.082874, 3.464102, 5),
    ]]
    chamfer(f5_edges, length=F5_SIZE)


with BuildPart() as f6:
    # F2 (on Top) → F6 (new body)
    with BuildSketch(Plane.XY):
        with Locations((-60.5567166209, -29.8474544287)):
            Rectangle(F2_W, F2_H)
        Polygon((-70.3716711971, -29.8474544287), (-65.464193909, -21.3474544287), (-55.6492393328, -21.3474544287), (-50.7417620447, -29.8474544287), (-55.6492393328, -38.3474544287), (-65.464193909, -38.3474544287), align=None, mode=Mode.SUBTRACT)
    extrude(amount=F6_DEPTH)


solid = Compound([f1.part, f3.part, f6.part])
